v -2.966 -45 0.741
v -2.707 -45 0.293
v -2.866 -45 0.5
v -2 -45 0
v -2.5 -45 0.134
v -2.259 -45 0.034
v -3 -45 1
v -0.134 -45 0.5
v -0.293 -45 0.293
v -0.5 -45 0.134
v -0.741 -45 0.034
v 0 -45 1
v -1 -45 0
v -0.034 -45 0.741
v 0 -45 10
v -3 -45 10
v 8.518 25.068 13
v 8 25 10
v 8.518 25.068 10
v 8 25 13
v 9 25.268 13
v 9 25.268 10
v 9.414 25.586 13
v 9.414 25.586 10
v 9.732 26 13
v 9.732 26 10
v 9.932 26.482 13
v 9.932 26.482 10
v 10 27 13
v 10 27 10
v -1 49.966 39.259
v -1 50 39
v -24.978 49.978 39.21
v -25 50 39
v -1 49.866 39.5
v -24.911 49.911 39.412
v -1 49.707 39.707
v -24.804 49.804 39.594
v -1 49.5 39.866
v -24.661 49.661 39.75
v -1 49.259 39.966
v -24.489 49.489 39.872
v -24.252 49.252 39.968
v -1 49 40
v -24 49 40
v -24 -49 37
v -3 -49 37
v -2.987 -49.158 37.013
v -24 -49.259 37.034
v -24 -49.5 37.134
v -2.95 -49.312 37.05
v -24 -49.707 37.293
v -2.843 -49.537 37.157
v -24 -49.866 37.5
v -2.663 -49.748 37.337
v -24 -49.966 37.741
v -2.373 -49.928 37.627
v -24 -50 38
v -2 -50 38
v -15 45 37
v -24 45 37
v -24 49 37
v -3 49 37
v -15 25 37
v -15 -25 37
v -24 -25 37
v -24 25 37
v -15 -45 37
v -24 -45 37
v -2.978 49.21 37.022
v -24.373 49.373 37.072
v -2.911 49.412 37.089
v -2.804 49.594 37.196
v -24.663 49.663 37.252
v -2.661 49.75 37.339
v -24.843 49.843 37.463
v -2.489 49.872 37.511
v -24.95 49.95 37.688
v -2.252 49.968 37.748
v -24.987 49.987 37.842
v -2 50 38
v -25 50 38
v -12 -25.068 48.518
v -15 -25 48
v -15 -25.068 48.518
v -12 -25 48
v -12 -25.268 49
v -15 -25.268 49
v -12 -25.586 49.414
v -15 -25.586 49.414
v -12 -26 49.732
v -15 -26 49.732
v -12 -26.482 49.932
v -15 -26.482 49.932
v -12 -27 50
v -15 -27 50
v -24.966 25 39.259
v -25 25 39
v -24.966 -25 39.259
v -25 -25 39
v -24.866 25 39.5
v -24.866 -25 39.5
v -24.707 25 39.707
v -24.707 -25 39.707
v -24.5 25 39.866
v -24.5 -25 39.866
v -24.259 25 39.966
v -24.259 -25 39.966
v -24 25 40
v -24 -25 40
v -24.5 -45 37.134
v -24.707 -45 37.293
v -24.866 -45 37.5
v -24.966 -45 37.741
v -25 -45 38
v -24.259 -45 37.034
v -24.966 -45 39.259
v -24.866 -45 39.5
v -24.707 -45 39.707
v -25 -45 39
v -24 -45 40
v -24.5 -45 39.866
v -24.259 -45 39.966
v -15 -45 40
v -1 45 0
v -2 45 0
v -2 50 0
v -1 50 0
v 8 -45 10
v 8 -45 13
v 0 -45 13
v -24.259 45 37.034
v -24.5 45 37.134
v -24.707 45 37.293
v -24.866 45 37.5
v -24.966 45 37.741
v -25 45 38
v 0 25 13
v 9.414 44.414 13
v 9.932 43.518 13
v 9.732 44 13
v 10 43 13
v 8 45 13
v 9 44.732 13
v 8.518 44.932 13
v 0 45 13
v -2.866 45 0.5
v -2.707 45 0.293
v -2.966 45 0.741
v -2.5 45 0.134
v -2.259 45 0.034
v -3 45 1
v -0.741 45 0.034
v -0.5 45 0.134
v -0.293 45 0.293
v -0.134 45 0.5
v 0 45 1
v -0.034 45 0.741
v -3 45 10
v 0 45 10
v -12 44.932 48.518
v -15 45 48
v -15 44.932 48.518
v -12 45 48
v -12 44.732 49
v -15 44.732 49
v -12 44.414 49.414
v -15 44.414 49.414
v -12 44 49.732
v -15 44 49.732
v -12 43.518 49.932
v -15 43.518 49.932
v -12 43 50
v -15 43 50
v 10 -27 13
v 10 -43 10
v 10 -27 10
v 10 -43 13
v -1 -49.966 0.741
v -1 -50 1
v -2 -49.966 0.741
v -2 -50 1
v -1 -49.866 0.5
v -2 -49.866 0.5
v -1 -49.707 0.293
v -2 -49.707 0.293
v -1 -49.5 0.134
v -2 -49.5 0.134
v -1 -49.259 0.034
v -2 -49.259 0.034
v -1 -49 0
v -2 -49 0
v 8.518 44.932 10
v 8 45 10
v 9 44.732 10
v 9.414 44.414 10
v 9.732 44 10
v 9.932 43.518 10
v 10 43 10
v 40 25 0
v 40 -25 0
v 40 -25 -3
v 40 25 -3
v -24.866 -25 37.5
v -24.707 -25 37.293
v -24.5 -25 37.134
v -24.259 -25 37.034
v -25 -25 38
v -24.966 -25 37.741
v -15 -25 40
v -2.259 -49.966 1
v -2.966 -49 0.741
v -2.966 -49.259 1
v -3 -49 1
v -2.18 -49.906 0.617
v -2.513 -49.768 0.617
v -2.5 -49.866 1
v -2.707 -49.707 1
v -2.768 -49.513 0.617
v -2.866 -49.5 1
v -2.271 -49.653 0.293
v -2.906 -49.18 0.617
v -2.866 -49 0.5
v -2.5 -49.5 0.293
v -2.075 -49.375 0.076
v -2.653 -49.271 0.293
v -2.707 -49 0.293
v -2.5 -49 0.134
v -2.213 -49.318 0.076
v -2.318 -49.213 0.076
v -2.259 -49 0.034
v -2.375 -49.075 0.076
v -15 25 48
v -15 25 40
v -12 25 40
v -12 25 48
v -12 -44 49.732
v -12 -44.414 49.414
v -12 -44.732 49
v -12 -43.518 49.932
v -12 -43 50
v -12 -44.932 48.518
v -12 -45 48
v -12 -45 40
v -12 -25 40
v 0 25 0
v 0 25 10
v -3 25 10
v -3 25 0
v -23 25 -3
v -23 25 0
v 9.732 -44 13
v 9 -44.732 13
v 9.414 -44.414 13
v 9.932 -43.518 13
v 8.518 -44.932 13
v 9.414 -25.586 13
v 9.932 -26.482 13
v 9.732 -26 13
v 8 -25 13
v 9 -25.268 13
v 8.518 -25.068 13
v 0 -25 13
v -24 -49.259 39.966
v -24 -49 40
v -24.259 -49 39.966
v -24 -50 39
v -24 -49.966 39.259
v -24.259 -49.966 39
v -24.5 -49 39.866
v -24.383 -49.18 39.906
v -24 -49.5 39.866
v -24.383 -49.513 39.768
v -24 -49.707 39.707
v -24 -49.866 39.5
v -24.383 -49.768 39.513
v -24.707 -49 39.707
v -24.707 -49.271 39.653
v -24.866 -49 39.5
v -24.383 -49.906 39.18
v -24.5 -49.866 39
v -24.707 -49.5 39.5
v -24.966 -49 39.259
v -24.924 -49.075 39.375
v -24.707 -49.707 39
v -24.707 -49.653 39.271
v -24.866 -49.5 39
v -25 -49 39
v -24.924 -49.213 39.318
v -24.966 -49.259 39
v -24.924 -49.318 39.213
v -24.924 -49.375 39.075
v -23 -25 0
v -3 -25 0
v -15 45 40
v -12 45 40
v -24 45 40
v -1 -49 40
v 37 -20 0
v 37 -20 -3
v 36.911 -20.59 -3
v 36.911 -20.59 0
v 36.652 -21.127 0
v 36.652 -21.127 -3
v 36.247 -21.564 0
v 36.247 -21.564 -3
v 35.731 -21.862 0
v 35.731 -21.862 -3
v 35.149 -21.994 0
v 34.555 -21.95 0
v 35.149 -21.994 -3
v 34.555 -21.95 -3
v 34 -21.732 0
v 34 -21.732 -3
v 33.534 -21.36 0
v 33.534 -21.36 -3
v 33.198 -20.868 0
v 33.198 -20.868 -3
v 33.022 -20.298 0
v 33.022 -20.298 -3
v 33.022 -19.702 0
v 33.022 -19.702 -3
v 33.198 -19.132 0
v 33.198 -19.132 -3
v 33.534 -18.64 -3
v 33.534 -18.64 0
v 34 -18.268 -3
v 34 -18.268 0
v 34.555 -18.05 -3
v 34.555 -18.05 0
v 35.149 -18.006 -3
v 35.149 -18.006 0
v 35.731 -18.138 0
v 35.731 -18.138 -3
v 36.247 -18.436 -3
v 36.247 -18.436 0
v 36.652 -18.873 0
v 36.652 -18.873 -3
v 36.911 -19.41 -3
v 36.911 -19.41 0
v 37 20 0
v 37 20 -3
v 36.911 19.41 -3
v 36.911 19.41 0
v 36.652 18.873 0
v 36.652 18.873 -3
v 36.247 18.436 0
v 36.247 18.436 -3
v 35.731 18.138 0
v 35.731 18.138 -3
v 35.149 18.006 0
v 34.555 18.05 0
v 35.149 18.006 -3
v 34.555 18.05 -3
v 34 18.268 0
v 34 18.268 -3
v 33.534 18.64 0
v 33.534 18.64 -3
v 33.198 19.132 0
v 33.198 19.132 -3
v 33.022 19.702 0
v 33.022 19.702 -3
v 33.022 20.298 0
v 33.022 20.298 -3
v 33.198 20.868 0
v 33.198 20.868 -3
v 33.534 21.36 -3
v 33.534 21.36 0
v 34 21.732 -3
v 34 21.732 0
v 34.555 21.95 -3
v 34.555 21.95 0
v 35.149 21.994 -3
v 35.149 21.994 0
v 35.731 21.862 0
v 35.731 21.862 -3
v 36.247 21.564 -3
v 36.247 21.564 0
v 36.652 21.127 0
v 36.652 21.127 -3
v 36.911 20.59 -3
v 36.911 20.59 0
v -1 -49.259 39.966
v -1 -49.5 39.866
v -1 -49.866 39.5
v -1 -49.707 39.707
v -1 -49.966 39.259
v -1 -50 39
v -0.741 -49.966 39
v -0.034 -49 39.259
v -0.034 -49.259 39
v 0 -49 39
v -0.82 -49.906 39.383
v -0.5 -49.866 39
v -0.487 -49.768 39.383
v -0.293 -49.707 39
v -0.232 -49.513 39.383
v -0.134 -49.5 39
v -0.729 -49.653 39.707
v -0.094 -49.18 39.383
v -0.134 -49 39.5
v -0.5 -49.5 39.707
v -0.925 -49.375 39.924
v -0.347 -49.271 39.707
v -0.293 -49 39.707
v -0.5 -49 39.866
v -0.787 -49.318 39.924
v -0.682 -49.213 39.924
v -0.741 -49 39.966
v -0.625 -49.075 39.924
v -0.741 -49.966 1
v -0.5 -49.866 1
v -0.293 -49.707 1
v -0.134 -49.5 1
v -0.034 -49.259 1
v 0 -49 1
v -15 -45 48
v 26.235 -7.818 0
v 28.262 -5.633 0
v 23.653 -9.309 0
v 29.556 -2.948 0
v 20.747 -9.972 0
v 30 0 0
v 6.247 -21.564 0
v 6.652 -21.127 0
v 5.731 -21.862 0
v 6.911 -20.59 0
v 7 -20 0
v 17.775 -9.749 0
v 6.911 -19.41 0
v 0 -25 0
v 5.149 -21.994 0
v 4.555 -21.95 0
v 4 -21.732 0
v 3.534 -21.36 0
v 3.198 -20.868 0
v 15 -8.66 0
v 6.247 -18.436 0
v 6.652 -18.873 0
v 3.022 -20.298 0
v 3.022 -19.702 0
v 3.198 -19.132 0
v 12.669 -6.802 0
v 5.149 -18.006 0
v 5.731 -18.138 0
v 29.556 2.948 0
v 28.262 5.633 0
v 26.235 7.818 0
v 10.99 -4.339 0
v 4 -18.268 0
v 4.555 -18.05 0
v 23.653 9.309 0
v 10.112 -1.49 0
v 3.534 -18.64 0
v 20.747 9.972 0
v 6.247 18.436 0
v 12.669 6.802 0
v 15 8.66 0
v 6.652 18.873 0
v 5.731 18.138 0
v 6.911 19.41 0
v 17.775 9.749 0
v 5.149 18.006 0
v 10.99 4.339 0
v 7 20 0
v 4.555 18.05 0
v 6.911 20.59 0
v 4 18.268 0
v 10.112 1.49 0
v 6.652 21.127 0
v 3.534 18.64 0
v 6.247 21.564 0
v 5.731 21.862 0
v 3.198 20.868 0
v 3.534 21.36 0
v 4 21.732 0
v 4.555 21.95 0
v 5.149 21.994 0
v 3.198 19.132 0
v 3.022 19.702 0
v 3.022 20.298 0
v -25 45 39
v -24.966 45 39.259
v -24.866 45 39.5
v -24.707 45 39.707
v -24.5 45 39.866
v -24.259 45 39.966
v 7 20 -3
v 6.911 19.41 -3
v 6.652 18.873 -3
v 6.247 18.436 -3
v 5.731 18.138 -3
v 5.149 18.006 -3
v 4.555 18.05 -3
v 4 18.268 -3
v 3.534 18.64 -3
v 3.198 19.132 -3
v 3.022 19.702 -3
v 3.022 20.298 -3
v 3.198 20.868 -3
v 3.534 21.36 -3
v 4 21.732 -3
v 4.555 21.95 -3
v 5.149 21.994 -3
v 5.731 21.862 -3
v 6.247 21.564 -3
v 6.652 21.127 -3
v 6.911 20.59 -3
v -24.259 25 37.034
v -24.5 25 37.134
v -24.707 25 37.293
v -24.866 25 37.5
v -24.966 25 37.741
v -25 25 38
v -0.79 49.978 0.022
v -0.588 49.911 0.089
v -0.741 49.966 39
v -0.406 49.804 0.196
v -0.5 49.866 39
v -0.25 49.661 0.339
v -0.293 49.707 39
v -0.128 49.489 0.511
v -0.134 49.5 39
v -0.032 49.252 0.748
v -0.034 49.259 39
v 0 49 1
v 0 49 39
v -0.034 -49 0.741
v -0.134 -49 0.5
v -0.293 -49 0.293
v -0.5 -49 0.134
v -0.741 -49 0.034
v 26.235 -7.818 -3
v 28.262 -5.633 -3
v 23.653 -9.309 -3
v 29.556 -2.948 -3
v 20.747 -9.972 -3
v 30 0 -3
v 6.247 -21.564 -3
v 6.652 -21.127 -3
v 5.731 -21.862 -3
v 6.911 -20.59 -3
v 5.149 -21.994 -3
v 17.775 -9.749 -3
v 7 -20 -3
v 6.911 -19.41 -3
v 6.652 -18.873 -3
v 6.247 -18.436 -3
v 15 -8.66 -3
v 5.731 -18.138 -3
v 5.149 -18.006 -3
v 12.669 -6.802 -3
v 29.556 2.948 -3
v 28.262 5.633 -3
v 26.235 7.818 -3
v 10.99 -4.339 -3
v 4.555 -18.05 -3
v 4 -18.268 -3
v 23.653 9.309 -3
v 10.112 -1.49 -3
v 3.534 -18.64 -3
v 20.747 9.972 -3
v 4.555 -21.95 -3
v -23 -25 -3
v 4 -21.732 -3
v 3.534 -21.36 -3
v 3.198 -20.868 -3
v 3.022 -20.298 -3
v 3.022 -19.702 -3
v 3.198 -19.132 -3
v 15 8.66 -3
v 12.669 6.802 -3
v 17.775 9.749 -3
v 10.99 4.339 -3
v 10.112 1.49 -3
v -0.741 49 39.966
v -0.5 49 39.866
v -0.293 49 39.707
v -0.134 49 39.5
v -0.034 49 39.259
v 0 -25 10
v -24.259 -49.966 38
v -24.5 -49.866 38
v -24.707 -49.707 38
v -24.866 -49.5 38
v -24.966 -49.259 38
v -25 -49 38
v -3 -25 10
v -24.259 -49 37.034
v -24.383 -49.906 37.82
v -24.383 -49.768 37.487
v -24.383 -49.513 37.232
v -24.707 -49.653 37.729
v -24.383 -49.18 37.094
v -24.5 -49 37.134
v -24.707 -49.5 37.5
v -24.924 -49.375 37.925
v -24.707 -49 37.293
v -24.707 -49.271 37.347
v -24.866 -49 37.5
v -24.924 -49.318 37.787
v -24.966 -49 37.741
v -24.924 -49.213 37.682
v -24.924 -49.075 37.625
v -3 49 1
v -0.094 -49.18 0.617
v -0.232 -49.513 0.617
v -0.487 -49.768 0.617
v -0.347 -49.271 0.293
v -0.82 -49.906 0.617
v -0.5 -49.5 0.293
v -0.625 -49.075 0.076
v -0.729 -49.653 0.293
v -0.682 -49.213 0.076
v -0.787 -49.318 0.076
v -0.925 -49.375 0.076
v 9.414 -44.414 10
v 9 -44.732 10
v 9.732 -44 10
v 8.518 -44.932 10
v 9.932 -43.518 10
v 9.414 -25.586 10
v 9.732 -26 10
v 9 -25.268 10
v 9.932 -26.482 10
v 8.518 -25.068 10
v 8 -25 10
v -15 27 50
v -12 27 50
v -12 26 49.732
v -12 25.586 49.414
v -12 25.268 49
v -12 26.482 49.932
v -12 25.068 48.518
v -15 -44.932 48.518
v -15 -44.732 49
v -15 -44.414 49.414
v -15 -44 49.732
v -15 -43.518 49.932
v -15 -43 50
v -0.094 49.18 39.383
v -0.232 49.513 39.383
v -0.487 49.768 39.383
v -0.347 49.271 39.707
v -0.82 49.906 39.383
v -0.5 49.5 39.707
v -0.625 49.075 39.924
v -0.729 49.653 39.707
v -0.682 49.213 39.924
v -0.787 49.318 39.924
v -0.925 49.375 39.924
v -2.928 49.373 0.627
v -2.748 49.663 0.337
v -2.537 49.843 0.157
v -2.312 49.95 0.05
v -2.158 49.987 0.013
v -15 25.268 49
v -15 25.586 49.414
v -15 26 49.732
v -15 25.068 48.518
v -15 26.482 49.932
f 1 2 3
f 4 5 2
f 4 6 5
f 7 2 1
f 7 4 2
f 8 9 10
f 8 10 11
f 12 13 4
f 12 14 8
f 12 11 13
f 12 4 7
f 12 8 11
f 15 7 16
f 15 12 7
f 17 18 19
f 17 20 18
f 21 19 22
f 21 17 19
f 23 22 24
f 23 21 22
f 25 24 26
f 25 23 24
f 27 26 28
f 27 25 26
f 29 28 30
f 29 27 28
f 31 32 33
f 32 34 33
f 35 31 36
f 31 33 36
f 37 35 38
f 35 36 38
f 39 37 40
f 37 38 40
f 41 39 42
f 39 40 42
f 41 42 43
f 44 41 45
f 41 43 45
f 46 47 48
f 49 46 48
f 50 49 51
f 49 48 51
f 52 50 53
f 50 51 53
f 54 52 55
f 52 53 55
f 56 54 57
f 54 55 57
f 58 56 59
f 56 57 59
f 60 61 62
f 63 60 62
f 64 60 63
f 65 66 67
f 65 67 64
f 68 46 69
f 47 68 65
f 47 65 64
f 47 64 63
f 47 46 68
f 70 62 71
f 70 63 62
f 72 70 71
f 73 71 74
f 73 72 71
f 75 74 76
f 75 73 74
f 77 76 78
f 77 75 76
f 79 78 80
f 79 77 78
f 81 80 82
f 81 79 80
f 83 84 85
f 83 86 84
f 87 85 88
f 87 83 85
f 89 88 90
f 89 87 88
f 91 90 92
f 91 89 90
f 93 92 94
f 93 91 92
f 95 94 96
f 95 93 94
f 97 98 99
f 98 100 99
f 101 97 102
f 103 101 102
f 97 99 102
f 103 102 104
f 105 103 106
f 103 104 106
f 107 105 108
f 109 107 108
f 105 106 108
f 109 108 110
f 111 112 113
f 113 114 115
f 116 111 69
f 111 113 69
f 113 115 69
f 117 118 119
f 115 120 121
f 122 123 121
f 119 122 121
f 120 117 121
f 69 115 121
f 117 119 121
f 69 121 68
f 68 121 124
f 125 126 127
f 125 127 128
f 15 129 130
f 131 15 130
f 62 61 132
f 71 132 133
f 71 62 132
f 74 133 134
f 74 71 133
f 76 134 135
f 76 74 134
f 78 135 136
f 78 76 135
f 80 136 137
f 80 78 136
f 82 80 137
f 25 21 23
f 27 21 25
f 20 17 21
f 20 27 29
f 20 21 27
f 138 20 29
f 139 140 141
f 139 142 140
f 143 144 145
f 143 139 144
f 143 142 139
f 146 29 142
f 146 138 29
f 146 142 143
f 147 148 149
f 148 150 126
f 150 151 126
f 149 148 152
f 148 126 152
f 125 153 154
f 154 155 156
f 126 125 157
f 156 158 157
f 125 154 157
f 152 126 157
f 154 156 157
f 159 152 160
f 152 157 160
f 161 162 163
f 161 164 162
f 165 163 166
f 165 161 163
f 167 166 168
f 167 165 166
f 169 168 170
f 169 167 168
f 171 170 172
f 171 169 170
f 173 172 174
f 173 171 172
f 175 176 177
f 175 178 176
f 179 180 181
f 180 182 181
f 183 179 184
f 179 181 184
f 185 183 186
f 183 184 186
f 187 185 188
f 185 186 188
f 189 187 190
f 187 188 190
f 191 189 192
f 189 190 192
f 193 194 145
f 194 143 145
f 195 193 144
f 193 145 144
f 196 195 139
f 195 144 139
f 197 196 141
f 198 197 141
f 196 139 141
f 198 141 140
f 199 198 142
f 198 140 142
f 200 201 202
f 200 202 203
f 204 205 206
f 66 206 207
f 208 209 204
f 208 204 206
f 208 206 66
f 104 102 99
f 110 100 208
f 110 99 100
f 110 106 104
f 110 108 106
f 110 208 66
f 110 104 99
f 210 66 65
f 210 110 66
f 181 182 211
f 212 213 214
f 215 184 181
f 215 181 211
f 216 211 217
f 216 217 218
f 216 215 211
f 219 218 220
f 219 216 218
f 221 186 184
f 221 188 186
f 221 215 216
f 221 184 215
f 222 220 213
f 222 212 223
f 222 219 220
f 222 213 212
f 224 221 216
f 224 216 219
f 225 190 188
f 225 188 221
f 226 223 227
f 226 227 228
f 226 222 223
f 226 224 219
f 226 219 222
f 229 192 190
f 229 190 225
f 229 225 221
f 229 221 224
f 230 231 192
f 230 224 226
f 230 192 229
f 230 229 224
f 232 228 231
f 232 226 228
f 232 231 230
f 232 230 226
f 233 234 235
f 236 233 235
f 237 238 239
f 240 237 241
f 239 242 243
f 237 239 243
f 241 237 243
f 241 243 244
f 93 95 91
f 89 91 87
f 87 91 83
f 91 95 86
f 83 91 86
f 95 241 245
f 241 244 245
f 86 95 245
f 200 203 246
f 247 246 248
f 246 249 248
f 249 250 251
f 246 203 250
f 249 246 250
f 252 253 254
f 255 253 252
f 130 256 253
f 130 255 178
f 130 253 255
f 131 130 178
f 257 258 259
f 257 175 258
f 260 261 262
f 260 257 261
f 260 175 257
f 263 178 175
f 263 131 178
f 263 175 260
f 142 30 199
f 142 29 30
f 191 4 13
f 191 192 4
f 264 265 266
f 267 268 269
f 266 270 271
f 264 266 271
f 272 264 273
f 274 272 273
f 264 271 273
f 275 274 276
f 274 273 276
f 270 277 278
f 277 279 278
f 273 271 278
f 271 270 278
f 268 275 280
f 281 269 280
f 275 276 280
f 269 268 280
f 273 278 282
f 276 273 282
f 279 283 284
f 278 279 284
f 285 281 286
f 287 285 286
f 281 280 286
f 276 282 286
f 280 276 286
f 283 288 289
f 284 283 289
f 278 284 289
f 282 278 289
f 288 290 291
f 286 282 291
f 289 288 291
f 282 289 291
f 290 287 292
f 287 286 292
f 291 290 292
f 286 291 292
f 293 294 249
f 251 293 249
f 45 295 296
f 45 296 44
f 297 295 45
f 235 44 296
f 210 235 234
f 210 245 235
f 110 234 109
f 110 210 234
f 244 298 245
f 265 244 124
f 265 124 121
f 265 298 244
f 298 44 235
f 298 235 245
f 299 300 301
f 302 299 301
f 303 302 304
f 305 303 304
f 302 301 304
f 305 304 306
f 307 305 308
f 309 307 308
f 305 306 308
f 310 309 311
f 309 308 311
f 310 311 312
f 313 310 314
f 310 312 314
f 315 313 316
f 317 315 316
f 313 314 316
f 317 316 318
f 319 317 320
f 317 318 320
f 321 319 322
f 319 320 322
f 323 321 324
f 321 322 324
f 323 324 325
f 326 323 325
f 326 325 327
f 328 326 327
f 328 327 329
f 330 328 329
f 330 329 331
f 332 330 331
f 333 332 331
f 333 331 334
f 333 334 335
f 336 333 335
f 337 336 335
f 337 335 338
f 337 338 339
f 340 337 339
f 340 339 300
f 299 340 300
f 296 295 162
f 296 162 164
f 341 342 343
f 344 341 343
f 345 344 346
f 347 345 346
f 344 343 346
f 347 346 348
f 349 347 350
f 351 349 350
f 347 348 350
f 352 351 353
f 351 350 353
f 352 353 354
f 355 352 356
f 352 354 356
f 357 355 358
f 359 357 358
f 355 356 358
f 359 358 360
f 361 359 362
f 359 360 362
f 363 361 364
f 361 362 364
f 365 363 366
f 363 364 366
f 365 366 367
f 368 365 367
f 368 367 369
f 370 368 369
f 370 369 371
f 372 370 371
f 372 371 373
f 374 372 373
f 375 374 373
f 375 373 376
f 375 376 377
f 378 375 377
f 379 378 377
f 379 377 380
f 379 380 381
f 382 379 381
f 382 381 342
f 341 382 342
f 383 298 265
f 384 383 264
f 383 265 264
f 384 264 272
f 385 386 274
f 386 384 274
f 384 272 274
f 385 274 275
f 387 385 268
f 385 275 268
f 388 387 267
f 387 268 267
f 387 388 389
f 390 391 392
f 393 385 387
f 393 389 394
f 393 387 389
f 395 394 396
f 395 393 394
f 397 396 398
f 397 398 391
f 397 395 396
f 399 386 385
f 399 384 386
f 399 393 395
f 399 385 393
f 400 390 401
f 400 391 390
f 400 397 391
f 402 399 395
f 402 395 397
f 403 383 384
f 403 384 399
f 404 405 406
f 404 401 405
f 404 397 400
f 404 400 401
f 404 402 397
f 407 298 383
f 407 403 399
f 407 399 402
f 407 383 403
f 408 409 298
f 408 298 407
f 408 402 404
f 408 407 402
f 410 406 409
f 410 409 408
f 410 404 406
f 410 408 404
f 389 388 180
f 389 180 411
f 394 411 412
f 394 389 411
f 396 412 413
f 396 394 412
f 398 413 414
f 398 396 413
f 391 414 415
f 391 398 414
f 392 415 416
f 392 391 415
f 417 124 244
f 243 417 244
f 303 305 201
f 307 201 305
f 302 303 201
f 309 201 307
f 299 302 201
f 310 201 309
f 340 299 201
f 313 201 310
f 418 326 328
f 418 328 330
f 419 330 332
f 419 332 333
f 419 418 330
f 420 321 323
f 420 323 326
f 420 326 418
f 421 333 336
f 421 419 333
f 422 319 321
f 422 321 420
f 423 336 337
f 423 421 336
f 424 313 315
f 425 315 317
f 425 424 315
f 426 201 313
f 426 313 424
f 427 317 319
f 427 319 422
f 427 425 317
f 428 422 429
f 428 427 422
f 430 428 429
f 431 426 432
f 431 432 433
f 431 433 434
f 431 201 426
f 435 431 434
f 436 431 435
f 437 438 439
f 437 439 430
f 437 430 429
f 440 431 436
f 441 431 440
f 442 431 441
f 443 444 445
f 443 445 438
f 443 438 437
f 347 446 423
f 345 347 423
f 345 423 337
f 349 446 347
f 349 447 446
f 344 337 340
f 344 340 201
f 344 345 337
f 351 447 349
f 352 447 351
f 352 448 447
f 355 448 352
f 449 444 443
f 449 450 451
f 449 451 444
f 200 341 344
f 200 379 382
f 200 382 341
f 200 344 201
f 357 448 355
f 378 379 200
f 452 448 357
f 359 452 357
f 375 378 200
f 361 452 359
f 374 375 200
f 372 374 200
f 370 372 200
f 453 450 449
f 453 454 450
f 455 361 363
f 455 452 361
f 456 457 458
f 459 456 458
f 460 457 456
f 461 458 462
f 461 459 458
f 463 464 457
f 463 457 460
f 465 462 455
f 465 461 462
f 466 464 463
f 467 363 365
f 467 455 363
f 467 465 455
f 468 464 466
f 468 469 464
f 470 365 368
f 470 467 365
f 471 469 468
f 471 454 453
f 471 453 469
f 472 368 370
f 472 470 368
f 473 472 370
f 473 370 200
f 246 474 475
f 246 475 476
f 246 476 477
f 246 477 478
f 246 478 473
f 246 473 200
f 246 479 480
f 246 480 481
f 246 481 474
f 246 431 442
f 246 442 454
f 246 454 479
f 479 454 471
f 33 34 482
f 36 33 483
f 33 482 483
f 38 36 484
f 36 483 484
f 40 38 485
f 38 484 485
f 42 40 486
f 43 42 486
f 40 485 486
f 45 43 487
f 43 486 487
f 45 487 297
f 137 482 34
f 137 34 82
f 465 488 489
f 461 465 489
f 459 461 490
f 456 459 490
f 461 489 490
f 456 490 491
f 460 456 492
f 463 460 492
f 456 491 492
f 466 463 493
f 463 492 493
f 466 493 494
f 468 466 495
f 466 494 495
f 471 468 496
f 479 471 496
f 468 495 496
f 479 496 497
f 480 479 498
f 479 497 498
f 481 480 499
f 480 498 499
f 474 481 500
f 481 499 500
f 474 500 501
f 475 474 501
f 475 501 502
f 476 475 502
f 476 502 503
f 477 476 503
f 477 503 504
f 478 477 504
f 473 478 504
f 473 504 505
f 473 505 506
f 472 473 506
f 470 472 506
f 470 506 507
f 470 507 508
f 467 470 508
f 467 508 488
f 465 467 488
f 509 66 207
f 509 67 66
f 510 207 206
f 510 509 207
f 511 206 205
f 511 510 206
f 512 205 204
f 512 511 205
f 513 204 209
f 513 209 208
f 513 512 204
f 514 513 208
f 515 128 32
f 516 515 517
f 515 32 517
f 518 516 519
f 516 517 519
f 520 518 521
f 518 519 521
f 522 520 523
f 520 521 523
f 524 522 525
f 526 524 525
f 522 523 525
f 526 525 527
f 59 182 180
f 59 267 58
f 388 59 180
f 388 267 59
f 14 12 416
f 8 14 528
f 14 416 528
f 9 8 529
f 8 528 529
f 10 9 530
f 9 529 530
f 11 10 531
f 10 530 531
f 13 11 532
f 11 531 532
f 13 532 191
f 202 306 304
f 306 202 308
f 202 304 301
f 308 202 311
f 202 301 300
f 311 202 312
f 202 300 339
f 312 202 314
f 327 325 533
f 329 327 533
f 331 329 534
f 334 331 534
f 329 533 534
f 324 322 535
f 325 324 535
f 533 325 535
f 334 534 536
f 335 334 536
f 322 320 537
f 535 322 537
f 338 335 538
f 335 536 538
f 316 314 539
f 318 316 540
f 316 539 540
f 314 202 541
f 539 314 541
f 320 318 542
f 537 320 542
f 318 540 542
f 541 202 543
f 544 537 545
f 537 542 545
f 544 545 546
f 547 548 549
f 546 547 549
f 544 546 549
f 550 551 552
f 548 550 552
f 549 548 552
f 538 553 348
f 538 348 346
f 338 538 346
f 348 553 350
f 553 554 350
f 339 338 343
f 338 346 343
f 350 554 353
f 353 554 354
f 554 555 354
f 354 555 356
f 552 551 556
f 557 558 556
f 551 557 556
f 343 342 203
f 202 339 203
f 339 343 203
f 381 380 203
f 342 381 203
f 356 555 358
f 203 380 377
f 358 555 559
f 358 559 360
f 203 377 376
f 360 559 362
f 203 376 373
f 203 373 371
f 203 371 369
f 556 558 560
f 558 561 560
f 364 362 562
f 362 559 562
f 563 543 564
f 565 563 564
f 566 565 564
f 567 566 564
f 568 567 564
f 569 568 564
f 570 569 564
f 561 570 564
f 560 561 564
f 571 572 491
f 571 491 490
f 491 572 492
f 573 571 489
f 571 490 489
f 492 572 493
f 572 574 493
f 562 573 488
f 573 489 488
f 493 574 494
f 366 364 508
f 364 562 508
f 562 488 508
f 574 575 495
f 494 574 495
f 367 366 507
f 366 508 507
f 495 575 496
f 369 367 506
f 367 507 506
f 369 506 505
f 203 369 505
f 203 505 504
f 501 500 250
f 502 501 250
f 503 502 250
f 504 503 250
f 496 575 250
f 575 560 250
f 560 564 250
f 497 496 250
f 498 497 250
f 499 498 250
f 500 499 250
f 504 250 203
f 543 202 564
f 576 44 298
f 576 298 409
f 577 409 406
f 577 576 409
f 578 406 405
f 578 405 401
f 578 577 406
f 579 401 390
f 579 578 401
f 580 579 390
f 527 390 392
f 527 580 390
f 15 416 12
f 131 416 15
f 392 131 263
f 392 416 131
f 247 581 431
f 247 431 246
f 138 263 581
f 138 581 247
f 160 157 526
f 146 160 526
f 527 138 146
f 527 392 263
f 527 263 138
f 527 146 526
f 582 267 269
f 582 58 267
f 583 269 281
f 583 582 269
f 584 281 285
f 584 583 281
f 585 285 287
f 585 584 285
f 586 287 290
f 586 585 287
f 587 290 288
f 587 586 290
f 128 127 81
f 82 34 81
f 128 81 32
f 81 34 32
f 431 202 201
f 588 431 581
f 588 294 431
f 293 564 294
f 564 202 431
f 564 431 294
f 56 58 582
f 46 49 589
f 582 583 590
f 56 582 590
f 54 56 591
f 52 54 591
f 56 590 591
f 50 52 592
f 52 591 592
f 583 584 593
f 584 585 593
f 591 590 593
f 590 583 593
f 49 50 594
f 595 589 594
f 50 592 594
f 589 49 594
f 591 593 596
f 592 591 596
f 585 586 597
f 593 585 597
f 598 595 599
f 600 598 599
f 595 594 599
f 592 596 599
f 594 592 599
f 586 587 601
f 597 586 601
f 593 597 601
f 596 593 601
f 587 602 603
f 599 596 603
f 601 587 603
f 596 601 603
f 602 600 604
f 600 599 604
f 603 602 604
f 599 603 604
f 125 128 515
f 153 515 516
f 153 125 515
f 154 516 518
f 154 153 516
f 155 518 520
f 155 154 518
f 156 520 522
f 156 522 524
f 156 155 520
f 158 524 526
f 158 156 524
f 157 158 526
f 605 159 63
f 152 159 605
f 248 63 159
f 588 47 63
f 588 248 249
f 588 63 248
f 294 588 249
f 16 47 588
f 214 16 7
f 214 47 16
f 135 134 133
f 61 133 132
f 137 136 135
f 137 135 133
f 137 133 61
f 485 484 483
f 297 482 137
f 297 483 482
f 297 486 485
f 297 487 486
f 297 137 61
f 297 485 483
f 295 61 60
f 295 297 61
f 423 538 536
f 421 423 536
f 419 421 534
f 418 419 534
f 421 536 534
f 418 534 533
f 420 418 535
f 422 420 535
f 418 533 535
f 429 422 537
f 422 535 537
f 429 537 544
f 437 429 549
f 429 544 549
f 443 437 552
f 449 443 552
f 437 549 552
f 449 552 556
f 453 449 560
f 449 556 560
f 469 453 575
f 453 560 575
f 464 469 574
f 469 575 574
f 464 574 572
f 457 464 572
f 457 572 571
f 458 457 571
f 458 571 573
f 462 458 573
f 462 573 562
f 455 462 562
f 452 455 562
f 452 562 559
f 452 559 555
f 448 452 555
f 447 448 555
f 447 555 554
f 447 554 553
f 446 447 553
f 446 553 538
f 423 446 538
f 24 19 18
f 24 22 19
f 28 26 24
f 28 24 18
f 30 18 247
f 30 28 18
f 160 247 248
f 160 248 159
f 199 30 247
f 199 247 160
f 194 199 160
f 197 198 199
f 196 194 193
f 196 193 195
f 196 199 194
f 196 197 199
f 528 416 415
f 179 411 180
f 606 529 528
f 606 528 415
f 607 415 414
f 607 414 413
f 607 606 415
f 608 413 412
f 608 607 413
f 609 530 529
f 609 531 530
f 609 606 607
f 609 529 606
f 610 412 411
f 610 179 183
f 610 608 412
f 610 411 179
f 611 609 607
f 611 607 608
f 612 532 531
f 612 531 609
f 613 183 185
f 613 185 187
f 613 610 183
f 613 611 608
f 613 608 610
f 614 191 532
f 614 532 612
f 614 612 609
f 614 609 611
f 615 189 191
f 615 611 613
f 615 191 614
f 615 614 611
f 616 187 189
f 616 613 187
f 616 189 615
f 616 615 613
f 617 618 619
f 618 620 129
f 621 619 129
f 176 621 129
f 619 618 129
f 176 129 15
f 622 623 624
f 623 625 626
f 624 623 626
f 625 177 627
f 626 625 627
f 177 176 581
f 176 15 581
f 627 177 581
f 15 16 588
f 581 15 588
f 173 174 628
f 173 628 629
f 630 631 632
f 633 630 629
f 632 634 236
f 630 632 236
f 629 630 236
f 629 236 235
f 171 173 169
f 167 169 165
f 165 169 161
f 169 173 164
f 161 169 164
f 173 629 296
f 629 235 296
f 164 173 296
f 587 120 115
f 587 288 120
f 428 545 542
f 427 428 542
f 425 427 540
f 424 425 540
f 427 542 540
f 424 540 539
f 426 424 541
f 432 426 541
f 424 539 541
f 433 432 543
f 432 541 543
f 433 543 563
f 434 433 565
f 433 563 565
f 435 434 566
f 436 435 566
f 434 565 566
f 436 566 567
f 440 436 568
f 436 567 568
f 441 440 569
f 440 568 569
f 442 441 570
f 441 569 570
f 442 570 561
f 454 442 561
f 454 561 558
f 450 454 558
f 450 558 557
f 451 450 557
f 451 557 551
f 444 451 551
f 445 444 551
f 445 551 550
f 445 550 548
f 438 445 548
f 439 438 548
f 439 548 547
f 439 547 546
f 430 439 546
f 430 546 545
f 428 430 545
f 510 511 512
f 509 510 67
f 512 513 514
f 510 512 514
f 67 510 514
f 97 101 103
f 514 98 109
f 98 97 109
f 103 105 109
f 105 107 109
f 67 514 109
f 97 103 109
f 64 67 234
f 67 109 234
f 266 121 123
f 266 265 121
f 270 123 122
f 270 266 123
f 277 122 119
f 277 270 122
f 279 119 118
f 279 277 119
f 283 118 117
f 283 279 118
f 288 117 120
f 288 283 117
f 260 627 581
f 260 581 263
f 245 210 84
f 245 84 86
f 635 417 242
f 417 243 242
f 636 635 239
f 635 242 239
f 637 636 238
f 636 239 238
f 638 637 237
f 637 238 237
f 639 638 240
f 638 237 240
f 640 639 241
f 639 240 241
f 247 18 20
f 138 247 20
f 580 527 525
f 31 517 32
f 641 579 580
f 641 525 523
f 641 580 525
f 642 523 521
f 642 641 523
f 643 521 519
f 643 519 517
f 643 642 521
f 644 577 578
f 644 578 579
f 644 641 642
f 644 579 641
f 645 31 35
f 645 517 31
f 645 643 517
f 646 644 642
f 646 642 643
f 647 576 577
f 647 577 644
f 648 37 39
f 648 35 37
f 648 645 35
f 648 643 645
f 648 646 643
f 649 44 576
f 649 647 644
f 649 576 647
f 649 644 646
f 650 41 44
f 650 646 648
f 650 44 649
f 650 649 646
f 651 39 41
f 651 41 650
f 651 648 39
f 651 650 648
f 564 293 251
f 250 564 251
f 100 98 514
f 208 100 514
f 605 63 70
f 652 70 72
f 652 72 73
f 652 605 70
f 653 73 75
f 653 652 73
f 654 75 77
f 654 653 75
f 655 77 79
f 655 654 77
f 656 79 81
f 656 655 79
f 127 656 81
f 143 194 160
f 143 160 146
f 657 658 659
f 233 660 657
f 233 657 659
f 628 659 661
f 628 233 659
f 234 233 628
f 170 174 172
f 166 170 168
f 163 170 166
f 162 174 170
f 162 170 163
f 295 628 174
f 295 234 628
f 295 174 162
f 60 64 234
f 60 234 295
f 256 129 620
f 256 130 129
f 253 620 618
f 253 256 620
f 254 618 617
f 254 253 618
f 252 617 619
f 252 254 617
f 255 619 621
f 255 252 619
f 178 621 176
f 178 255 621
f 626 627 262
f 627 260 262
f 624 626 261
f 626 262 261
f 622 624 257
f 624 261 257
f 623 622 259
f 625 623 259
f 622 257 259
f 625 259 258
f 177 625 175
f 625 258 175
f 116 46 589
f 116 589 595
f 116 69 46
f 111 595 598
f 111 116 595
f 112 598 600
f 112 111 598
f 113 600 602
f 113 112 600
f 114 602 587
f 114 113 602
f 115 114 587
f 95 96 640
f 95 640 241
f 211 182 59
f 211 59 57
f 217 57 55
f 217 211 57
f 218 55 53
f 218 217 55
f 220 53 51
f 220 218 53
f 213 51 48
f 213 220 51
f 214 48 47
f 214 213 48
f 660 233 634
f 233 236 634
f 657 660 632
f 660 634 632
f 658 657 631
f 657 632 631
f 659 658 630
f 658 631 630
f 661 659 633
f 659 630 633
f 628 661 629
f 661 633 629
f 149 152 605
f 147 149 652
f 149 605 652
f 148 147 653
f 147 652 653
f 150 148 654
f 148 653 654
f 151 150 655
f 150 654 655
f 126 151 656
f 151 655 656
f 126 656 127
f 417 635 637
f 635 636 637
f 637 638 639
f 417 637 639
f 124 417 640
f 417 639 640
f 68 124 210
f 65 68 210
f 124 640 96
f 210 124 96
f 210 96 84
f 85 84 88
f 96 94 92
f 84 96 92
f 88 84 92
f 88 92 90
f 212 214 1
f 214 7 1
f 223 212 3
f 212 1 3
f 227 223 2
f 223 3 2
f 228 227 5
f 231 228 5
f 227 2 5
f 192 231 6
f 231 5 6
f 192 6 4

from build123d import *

# Parameters (mm, degrees)
F1_DEPTH      = 50
F2_W          = 20
F2_H          = 10
F3_DEPTH      = 3
F2_H_2        = 3
F4_DEPTH      = 10
F5_W          = 10
F5_H          = 20
F6_DEPTH      = 3
F5_W_2        = 3
F7_DEPTH      = 10
F8_R          = 2
F9_R          = 1
F10_R         = 1
F11_R         = 1
F12_T1_DEPTH  = 98
F12_S5_W      = 1
F12_S5_H      = 1
F12_T6_DEPTH  = 1
F12_S11_W     = 1
F12_S11_H     = 1
F12_T12_DEPTH = 1
F13_W         = 50
F13_H         = 3
F14_DEPTH     = 23
F15_W         = 50
F15_H         = 3
F16_DEPTH     = 40
F17_R         = 2
F17_R_2       = 10
F18_DEPTH     = 25


# Not quite as in the source:
# - a fillet or chamfer that OpenCascade refuses, or shapes differently, is made with other operations: its cross-section is extruded or revolved along the edge and cut away or added


with BuildPart() as f1:
    # F0 (on Front) → F1 (new body, symmetric)
    with BuildSketch(Plane.XZ):
        Polygon((-3, 0), (0, 0), (0, 40), (-25, 40), (-25, 37), (-3, 37), align=None)
    extrude(amount=F1_DEPTH, both=True)

    # F2 (on face) → F3 (cut, through all)
    with BuildSketch(Plane.YZ):
        with Locations((-35, 5)):
            Rectangle(F2_W, F2_H)
        with Locations((35, 5)):
            Rectangle(F2_W, F2_H)
    extrude(amount=-F3_DEPTH, mode=Mode.SUBTRACT)

    # F2 (on face) → F4 (join)
    with BuildSketch(Plane.YZ):
        with Locations((-35, 11.5)):
            Rectangle(F2_W, F2_H_2)
        with Locations((35, 11.5)):
            Rectangle(F2_W, F2_H_2)
    extrude(amount=F4_DEPTH)

    # F5 (on face) → F6 (cut, through all)
    with BuildSketch(Plane.XY.offset(40)):
        with Locations((-20, 35)):
            Rectangle(F5_W, F5_H)
        with Locations((-20, -35)):
            Rectangle(F5_W, F5_H)
    extrude(amount=-F6_DEPTH, mode=Mode.SUBTRACT)

    # F5 (on face) → F7 (join)
    with BuildSketch(Plane.XY.offset(40)):
        with Locations((-13.5, 35)):
            Rectangle(F5_W_2, F5_H)
        with Locations((-13.5, -35)):
            Rectangle(F5_W_2, F5_H)
    extrude(amount=F7_DEPTH)

    # F8
    f8_edges = [f1.edges().sort_by_distance(p)[0] for p in [
        (-13.5, 25, 50),
        (-13.5, 45, 50),
        (-13.5, -25, 50),
        (-13.5, -45, 50),
        (10, -45, 11.5),
        (10, -25, 11.5),
        (10, 25, 11.5),
        (10, 45, 11.5),
    ]]
    fillet(f8_edges, radius=F8_R)

    # F9
    f9_edges = [f1.edges().sort_by_distance(p)[0] for p in [
        (-12.5, -50, 40),
        (0, -50, 20),
        (-3, -50, 18.5),
        (-14, -50, 37),
    ]]
    fillet(f9_edges, radius=F9_R)

    # F10
    f10_edges = [f1.edges().sort_by_distance(p)[0] for p in [
        (-25, -47, 37),
        (-25, -47, 40),
    ]]
    fillet(f10_edges, radius=F10_R)

    # F11
    f11_edges = [f1.edges().sort_by_distance(p)[0] for p in [
        (-25, 0, 40),
        (-25, 0, 37),
        (-25, 47.5, 40),
        (-25, 47.5, 37),
        (-14, 50, 37),
        (-12.5, 50, 40),
        (-3, 50, 18.5),
        (0, 50, 20),
        (-3, 47.5, 0),
        (0, 47.5, 0),
        (-3, -47, 0),
        (0, -47, 0),
    ]]
    fillet(f11_edges, radius=F11_R)

    # F12: fillet of radius 1 on 1 edges, made by hand

    # F12_s2 → F12_t1 (cut)
    with BuildSketch(Plane.XZ.offset(-49)):
        with BuildLine():
            ThreePointArc((-1, 40), (-0.2928932188, 39.7071067812), (0, 39))
            Line((0, 39), (0, 40))
            Line((0, 40), (-1, 40))
        make_face()
    extrude(amount=F12_T1_DEPTH, mode=Mode.SUBTRACT)


with BuildPart() as f12_tool4:
    # F12_s5 → F12_t6 (new body)
    with BuildSketch(Plane.XY.offset(39)):
        with Locations((-0.5, 49.5)):
            Rectangle(F12_S5_W, F12_S5_H)
    extrude(amount=F12_T6_DEPTH)

    # F12_s7 → F12_t8 (revolve, cut)
    with BuildSketch(Plane(origin=(-1, 49, 39), x_dir=(-0.7071067812, -0.7071067812, 0), z_dir=(-0.7071067812, 0.7071067812, 0))):
        with BuildLine():
            ThreePointArc((0, -1), (1, 0), (0, 1))
            Line((0, 1), (0, -1))
        make_face()
    revolve(axis=Axis((-1, 49, 39), (0, 0, 1)), mode=Mode.SUBTRACT)


with BuildPart() as f1_1:
    add(f1.part)

    # F12_t3: cut F12_tool4
    add(f12_tool4.part, mode=Mode.SUBTRACT)


with BuildPart() as f12_tool10:
    # F12_s11 → F12_t12 (new body)
    with BuildSketch(Plane.XY.offset(39)):
        with Locations((-0.5, -49.5)):
            Rectangle(F12_S11_W, F12_S11_H)
    extrude(amount=F12_T12_DEPTH)

    # F12_s13 → F12_t14 (revolve, cut)
    with BuildSketch(Plane(origin=(-1, -49, 39), x_dir=(-0.7071067812, 0.7071067812, 0), z_dir=(0.7071067812, 0.7071067812, 0))):
        with BuildLine():
            ThreePointArc((0, -1), (1, 0), (0, 1))
            Line((0, 1), (0, -1))
        make_face()
    revolve(axis=Axis((-1, -49, 39), (0, 0, 1)), mode=Mode.SUBTRACT)


with BuildPart() as f1_2:
    add(f1_1.part)

    # F12_t9: cut F12_tool10
    add(f12_tool10.part, mode=Mode.SUBTRACT)

    # F13 (on Right) → F14 (join)
    with BuildSketch(Plane.YZ):
        with Locations((0, -1.5)):
            Rectangle(F13_W, F13_H)
    extrude(amount=-F14_DEPTH)

    # F15 (on face) → F16 (join)
    with BuildSketch(Plane.YZ):
        with Locations((0, -1.5)):
            Rectangle(F15_W, F15_H)
    extrude(amount=F16_DEPTH)

    # F17 (on face) → F18 (cut)
    with BuildSketch(Plane(origin=(0, 0, -3), x_dir=(1, 0, 0), z_dir=(0, 0, -1))):
        with Locations((35, 20)):
            Circle(F17_R)
        with Locations((5, 20)):
            Circle(F17_R)
        with Locations((20, 0)):
            Circle(F17_R_2)
        with Locations((35, -20)):
            Circle(F17_R)
        with Locations((5, -20)):
            Circle(F17_R)
    extrude(amount=-F18_DEPTH, mode=Mode.SUBTRACT)


solid = f1_2.part
